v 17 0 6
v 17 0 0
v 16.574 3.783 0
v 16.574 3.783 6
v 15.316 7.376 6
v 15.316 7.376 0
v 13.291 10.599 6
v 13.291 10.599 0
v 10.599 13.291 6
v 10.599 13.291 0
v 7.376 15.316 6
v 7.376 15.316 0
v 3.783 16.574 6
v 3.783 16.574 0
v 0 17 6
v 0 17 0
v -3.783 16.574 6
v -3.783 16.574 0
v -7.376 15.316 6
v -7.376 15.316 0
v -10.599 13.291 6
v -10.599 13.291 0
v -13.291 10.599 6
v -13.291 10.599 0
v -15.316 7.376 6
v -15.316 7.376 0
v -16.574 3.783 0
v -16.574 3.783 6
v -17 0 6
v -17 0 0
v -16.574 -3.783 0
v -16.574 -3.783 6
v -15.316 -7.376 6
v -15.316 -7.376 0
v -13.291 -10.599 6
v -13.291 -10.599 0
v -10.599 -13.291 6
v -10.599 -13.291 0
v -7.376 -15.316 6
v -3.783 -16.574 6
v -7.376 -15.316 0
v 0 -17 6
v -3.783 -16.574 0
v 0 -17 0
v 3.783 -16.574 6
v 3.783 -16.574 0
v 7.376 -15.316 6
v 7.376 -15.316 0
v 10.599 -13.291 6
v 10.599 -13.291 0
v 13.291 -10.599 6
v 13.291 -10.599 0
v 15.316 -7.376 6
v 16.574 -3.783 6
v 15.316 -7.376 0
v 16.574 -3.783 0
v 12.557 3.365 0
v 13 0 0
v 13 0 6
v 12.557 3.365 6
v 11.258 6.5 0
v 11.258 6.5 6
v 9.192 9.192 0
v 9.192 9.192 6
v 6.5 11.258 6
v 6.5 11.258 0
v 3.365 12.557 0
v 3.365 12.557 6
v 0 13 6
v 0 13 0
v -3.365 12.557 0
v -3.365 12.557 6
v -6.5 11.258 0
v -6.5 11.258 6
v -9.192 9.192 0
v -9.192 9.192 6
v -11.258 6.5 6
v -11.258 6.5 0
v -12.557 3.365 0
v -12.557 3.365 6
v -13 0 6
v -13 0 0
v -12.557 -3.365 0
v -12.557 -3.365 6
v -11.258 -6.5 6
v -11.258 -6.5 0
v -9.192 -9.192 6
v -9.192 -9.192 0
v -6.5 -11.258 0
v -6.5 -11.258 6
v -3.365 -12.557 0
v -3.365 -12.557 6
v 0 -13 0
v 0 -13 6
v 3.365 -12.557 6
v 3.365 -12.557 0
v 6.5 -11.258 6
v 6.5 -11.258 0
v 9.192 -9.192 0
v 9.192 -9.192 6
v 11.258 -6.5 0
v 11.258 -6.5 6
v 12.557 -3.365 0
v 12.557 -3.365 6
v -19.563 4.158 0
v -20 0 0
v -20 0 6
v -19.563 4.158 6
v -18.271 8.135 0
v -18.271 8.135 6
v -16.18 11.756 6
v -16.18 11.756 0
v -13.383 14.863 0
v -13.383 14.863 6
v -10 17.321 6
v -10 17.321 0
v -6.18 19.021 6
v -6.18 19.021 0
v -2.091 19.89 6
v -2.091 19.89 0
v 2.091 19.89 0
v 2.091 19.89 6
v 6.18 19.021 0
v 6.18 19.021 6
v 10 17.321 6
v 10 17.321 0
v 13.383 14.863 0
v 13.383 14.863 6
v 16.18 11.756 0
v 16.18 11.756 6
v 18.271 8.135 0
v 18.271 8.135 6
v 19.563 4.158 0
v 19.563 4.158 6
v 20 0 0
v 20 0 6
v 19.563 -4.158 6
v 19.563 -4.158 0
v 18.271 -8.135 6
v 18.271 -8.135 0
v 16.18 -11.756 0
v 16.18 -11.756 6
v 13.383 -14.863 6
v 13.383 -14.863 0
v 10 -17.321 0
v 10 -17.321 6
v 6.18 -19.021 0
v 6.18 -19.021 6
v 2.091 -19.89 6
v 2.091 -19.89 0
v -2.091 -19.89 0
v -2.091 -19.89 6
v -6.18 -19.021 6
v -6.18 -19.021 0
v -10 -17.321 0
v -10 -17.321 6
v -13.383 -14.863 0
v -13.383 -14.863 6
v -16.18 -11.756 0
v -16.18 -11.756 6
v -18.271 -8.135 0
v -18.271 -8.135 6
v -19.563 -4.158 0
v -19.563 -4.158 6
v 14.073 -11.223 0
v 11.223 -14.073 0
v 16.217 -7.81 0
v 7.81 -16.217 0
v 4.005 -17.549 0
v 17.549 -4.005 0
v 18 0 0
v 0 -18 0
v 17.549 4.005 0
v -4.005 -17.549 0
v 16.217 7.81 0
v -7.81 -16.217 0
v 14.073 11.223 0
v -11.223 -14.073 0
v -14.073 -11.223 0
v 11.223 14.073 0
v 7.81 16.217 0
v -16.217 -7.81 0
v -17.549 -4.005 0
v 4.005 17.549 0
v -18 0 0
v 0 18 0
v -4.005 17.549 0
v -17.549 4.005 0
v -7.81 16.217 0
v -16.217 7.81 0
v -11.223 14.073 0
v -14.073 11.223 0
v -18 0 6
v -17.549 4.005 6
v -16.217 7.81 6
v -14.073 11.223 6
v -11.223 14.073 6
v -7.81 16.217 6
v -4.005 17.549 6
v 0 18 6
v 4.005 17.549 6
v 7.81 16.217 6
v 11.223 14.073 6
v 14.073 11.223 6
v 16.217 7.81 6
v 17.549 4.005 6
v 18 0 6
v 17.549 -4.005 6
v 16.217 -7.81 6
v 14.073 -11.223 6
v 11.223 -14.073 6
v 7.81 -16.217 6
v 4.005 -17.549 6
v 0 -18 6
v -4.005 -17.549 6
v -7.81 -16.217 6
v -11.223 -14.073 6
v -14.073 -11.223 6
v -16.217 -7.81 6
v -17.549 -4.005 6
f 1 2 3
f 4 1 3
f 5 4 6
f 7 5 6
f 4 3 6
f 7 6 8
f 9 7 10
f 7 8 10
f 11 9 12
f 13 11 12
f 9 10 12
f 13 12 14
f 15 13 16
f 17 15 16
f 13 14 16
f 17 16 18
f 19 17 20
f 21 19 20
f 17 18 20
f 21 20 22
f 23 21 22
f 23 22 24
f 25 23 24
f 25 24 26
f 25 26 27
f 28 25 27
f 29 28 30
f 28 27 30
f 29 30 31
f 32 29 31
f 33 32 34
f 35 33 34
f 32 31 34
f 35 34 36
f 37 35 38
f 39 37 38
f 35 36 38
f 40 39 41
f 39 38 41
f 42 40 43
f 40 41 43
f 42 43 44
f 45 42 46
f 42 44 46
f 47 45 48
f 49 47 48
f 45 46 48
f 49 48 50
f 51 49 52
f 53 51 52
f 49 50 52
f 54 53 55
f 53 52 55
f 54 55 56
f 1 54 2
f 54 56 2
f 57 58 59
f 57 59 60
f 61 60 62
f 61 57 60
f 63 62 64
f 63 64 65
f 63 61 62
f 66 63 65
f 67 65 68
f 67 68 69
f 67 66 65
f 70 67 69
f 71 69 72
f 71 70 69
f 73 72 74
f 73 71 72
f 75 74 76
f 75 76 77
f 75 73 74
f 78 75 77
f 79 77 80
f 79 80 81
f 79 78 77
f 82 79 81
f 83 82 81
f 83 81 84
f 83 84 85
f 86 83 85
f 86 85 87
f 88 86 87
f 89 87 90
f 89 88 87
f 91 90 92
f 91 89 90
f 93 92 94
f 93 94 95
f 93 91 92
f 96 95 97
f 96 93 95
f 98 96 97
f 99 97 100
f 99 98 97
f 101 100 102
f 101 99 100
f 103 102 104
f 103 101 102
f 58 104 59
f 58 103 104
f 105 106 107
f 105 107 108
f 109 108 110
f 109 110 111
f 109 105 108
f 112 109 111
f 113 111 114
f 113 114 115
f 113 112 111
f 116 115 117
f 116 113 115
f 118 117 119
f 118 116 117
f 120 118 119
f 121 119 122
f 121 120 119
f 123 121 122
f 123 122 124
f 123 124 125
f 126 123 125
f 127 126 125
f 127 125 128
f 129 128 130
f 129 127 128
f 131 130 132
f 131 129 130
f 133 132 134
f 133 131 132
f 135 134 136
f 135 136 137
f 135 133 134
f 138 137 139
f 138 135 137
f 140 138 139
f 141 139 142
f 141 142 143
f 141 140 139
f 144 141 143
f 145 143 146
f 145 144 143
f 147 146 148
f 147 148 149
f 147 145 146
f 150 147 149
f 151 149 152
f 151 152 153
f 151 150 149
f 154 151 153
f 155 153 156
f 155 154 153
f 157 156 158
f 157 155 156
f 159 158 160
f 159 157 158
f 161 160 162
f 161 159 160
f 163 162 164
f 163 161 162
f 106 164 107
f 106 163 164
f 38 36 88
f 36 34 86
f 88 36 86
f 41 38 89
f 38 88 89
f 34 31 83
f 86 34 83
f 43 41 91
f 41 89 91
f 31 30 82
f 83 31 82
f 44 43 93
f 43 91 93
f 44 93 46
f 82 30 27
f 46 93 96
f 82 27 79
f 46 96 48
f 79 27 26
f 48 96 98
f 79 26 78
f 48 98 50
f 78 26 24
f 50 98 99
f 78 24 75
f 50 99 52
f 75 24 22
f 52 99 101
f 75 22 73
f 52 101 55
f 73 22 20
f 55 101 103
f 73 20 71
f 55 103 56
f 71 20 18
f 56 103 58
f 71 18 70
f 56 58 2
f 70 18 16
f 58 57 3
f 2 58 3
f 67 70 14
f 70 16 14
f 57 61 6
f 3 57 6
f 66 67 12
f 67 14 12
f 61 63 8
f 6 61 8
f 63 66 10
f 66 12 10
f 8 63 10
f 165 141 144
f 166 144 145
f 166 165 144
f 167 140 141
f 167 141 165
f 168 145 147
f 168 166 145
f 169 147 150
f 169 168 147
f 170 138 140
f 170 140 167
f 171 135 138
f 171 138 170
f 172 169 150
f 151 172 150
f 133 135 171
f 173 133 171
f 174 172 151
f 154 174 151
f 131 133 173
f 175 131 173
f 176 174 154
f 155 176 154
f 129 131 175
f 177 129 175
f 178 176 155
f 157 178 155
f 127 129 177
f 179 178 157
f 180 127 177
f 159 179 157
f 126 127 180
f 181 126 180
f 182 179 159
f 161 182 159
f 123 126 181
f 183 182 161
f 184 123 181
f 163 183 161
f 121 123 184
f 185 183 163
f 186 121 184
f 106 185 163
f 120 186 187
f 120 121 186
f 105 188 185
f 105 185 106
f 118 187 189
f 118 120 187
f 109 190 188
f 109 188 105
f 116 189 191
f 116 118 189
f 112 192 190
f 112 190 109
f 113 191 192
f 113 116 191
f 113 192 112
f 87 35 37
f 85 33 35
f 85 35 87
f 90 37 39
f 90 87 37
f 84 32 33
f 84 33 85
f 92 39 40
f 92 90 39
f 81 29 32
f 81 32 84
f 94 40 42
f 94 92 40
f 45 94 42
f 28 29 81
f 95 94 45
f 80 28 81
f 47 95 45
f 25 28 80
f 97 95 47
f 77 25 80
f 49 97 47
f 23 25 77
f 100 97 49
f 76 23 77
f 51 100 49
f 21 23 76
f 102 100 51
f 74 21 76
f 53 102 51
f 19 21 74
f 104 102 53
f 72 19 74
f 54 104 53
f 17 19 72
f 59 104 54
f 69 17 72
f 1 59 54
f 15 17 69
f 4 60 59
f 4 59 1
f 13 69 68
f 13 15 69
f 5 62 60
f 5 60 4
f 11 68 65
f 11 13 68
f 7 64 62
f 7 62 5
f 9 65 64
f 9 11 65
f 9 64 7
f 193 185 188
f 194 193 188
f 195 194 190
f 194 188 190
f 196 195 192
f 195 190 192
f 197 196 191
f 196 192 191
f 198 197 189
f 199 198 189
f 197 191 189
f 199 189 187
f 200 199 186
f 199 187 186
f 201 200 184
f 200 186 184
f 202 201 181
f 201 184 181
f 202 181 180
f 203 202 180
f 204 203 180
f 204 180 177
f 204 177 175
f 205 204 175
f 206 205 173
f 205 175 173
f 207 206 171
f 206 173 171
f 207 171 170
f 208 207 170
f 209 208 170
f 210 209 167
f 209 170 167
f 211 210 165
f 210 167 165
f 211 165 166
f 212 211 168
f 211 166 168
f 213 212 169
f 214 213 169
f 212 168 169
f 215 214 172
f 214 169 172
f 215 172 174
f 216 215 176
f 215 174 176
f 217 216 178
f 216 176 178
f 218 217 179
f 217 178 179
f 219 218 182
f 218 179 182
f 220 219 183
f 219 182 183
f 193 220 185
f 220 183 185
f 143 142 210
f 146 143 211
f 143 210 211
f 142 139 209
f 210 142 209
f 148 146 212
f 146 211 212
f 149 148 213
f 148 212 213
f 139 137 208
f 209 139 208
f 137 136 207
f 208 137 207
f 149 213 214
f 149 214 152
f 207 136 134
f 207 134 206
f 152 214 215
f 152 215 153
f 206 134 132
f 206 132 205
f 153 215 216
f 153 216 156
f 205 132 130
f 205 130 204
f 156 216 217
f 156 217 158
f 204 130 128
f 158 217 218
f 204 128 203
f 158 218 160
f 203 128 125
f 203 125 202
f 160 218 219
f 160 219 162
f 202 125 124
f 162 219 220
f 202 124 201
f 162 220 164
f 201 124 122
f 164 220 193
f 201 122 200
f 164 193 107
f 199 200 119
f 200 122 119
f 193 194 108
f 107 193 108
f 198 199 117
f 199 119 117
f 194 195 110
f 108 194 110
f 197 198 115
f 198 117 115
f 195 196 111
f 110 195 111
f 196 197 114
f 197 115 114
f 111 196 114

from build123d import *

# Parameters (mm, degrees)
SKETCH1_R           = 17
SKETCH1_R_2         = 13
BOSS_EXTRUDE1_DEPTH = 6
SKETCH2_R           = 20
SKETCH2_R_2         = 18
BOSS_EXTRUDE2_DEPTH = 6


with BuildPart() as part:
    # Sketch1 → Boss-Extrude1 (new body)
    with BuildSketch(Plane.XY):
        Circle(SKETCH1_R)
        Circle(SKETCH1_R_2, mode=Mode.SUBTRACT)
    extrude(amount=BOSS_EXTRUDE1_DEPTH)


with BuildPart() as body_2:
    # Sketch2 → Boss-Extrude2 (new body)
    with BuildSketch(Plane(origin=(0, 0, 0), x_dir=(-1, 0, 0), z_dir=(0, 0, -1))):
        Circle(SKETCH2_R)
        Circle(SKETCH2_R_2, mode=Mode.SUBTRACT)
    extrude(amount=-BOSS_EXTRUDE2_DEPTH)


solid = Compound([part.part, body_2.part])
